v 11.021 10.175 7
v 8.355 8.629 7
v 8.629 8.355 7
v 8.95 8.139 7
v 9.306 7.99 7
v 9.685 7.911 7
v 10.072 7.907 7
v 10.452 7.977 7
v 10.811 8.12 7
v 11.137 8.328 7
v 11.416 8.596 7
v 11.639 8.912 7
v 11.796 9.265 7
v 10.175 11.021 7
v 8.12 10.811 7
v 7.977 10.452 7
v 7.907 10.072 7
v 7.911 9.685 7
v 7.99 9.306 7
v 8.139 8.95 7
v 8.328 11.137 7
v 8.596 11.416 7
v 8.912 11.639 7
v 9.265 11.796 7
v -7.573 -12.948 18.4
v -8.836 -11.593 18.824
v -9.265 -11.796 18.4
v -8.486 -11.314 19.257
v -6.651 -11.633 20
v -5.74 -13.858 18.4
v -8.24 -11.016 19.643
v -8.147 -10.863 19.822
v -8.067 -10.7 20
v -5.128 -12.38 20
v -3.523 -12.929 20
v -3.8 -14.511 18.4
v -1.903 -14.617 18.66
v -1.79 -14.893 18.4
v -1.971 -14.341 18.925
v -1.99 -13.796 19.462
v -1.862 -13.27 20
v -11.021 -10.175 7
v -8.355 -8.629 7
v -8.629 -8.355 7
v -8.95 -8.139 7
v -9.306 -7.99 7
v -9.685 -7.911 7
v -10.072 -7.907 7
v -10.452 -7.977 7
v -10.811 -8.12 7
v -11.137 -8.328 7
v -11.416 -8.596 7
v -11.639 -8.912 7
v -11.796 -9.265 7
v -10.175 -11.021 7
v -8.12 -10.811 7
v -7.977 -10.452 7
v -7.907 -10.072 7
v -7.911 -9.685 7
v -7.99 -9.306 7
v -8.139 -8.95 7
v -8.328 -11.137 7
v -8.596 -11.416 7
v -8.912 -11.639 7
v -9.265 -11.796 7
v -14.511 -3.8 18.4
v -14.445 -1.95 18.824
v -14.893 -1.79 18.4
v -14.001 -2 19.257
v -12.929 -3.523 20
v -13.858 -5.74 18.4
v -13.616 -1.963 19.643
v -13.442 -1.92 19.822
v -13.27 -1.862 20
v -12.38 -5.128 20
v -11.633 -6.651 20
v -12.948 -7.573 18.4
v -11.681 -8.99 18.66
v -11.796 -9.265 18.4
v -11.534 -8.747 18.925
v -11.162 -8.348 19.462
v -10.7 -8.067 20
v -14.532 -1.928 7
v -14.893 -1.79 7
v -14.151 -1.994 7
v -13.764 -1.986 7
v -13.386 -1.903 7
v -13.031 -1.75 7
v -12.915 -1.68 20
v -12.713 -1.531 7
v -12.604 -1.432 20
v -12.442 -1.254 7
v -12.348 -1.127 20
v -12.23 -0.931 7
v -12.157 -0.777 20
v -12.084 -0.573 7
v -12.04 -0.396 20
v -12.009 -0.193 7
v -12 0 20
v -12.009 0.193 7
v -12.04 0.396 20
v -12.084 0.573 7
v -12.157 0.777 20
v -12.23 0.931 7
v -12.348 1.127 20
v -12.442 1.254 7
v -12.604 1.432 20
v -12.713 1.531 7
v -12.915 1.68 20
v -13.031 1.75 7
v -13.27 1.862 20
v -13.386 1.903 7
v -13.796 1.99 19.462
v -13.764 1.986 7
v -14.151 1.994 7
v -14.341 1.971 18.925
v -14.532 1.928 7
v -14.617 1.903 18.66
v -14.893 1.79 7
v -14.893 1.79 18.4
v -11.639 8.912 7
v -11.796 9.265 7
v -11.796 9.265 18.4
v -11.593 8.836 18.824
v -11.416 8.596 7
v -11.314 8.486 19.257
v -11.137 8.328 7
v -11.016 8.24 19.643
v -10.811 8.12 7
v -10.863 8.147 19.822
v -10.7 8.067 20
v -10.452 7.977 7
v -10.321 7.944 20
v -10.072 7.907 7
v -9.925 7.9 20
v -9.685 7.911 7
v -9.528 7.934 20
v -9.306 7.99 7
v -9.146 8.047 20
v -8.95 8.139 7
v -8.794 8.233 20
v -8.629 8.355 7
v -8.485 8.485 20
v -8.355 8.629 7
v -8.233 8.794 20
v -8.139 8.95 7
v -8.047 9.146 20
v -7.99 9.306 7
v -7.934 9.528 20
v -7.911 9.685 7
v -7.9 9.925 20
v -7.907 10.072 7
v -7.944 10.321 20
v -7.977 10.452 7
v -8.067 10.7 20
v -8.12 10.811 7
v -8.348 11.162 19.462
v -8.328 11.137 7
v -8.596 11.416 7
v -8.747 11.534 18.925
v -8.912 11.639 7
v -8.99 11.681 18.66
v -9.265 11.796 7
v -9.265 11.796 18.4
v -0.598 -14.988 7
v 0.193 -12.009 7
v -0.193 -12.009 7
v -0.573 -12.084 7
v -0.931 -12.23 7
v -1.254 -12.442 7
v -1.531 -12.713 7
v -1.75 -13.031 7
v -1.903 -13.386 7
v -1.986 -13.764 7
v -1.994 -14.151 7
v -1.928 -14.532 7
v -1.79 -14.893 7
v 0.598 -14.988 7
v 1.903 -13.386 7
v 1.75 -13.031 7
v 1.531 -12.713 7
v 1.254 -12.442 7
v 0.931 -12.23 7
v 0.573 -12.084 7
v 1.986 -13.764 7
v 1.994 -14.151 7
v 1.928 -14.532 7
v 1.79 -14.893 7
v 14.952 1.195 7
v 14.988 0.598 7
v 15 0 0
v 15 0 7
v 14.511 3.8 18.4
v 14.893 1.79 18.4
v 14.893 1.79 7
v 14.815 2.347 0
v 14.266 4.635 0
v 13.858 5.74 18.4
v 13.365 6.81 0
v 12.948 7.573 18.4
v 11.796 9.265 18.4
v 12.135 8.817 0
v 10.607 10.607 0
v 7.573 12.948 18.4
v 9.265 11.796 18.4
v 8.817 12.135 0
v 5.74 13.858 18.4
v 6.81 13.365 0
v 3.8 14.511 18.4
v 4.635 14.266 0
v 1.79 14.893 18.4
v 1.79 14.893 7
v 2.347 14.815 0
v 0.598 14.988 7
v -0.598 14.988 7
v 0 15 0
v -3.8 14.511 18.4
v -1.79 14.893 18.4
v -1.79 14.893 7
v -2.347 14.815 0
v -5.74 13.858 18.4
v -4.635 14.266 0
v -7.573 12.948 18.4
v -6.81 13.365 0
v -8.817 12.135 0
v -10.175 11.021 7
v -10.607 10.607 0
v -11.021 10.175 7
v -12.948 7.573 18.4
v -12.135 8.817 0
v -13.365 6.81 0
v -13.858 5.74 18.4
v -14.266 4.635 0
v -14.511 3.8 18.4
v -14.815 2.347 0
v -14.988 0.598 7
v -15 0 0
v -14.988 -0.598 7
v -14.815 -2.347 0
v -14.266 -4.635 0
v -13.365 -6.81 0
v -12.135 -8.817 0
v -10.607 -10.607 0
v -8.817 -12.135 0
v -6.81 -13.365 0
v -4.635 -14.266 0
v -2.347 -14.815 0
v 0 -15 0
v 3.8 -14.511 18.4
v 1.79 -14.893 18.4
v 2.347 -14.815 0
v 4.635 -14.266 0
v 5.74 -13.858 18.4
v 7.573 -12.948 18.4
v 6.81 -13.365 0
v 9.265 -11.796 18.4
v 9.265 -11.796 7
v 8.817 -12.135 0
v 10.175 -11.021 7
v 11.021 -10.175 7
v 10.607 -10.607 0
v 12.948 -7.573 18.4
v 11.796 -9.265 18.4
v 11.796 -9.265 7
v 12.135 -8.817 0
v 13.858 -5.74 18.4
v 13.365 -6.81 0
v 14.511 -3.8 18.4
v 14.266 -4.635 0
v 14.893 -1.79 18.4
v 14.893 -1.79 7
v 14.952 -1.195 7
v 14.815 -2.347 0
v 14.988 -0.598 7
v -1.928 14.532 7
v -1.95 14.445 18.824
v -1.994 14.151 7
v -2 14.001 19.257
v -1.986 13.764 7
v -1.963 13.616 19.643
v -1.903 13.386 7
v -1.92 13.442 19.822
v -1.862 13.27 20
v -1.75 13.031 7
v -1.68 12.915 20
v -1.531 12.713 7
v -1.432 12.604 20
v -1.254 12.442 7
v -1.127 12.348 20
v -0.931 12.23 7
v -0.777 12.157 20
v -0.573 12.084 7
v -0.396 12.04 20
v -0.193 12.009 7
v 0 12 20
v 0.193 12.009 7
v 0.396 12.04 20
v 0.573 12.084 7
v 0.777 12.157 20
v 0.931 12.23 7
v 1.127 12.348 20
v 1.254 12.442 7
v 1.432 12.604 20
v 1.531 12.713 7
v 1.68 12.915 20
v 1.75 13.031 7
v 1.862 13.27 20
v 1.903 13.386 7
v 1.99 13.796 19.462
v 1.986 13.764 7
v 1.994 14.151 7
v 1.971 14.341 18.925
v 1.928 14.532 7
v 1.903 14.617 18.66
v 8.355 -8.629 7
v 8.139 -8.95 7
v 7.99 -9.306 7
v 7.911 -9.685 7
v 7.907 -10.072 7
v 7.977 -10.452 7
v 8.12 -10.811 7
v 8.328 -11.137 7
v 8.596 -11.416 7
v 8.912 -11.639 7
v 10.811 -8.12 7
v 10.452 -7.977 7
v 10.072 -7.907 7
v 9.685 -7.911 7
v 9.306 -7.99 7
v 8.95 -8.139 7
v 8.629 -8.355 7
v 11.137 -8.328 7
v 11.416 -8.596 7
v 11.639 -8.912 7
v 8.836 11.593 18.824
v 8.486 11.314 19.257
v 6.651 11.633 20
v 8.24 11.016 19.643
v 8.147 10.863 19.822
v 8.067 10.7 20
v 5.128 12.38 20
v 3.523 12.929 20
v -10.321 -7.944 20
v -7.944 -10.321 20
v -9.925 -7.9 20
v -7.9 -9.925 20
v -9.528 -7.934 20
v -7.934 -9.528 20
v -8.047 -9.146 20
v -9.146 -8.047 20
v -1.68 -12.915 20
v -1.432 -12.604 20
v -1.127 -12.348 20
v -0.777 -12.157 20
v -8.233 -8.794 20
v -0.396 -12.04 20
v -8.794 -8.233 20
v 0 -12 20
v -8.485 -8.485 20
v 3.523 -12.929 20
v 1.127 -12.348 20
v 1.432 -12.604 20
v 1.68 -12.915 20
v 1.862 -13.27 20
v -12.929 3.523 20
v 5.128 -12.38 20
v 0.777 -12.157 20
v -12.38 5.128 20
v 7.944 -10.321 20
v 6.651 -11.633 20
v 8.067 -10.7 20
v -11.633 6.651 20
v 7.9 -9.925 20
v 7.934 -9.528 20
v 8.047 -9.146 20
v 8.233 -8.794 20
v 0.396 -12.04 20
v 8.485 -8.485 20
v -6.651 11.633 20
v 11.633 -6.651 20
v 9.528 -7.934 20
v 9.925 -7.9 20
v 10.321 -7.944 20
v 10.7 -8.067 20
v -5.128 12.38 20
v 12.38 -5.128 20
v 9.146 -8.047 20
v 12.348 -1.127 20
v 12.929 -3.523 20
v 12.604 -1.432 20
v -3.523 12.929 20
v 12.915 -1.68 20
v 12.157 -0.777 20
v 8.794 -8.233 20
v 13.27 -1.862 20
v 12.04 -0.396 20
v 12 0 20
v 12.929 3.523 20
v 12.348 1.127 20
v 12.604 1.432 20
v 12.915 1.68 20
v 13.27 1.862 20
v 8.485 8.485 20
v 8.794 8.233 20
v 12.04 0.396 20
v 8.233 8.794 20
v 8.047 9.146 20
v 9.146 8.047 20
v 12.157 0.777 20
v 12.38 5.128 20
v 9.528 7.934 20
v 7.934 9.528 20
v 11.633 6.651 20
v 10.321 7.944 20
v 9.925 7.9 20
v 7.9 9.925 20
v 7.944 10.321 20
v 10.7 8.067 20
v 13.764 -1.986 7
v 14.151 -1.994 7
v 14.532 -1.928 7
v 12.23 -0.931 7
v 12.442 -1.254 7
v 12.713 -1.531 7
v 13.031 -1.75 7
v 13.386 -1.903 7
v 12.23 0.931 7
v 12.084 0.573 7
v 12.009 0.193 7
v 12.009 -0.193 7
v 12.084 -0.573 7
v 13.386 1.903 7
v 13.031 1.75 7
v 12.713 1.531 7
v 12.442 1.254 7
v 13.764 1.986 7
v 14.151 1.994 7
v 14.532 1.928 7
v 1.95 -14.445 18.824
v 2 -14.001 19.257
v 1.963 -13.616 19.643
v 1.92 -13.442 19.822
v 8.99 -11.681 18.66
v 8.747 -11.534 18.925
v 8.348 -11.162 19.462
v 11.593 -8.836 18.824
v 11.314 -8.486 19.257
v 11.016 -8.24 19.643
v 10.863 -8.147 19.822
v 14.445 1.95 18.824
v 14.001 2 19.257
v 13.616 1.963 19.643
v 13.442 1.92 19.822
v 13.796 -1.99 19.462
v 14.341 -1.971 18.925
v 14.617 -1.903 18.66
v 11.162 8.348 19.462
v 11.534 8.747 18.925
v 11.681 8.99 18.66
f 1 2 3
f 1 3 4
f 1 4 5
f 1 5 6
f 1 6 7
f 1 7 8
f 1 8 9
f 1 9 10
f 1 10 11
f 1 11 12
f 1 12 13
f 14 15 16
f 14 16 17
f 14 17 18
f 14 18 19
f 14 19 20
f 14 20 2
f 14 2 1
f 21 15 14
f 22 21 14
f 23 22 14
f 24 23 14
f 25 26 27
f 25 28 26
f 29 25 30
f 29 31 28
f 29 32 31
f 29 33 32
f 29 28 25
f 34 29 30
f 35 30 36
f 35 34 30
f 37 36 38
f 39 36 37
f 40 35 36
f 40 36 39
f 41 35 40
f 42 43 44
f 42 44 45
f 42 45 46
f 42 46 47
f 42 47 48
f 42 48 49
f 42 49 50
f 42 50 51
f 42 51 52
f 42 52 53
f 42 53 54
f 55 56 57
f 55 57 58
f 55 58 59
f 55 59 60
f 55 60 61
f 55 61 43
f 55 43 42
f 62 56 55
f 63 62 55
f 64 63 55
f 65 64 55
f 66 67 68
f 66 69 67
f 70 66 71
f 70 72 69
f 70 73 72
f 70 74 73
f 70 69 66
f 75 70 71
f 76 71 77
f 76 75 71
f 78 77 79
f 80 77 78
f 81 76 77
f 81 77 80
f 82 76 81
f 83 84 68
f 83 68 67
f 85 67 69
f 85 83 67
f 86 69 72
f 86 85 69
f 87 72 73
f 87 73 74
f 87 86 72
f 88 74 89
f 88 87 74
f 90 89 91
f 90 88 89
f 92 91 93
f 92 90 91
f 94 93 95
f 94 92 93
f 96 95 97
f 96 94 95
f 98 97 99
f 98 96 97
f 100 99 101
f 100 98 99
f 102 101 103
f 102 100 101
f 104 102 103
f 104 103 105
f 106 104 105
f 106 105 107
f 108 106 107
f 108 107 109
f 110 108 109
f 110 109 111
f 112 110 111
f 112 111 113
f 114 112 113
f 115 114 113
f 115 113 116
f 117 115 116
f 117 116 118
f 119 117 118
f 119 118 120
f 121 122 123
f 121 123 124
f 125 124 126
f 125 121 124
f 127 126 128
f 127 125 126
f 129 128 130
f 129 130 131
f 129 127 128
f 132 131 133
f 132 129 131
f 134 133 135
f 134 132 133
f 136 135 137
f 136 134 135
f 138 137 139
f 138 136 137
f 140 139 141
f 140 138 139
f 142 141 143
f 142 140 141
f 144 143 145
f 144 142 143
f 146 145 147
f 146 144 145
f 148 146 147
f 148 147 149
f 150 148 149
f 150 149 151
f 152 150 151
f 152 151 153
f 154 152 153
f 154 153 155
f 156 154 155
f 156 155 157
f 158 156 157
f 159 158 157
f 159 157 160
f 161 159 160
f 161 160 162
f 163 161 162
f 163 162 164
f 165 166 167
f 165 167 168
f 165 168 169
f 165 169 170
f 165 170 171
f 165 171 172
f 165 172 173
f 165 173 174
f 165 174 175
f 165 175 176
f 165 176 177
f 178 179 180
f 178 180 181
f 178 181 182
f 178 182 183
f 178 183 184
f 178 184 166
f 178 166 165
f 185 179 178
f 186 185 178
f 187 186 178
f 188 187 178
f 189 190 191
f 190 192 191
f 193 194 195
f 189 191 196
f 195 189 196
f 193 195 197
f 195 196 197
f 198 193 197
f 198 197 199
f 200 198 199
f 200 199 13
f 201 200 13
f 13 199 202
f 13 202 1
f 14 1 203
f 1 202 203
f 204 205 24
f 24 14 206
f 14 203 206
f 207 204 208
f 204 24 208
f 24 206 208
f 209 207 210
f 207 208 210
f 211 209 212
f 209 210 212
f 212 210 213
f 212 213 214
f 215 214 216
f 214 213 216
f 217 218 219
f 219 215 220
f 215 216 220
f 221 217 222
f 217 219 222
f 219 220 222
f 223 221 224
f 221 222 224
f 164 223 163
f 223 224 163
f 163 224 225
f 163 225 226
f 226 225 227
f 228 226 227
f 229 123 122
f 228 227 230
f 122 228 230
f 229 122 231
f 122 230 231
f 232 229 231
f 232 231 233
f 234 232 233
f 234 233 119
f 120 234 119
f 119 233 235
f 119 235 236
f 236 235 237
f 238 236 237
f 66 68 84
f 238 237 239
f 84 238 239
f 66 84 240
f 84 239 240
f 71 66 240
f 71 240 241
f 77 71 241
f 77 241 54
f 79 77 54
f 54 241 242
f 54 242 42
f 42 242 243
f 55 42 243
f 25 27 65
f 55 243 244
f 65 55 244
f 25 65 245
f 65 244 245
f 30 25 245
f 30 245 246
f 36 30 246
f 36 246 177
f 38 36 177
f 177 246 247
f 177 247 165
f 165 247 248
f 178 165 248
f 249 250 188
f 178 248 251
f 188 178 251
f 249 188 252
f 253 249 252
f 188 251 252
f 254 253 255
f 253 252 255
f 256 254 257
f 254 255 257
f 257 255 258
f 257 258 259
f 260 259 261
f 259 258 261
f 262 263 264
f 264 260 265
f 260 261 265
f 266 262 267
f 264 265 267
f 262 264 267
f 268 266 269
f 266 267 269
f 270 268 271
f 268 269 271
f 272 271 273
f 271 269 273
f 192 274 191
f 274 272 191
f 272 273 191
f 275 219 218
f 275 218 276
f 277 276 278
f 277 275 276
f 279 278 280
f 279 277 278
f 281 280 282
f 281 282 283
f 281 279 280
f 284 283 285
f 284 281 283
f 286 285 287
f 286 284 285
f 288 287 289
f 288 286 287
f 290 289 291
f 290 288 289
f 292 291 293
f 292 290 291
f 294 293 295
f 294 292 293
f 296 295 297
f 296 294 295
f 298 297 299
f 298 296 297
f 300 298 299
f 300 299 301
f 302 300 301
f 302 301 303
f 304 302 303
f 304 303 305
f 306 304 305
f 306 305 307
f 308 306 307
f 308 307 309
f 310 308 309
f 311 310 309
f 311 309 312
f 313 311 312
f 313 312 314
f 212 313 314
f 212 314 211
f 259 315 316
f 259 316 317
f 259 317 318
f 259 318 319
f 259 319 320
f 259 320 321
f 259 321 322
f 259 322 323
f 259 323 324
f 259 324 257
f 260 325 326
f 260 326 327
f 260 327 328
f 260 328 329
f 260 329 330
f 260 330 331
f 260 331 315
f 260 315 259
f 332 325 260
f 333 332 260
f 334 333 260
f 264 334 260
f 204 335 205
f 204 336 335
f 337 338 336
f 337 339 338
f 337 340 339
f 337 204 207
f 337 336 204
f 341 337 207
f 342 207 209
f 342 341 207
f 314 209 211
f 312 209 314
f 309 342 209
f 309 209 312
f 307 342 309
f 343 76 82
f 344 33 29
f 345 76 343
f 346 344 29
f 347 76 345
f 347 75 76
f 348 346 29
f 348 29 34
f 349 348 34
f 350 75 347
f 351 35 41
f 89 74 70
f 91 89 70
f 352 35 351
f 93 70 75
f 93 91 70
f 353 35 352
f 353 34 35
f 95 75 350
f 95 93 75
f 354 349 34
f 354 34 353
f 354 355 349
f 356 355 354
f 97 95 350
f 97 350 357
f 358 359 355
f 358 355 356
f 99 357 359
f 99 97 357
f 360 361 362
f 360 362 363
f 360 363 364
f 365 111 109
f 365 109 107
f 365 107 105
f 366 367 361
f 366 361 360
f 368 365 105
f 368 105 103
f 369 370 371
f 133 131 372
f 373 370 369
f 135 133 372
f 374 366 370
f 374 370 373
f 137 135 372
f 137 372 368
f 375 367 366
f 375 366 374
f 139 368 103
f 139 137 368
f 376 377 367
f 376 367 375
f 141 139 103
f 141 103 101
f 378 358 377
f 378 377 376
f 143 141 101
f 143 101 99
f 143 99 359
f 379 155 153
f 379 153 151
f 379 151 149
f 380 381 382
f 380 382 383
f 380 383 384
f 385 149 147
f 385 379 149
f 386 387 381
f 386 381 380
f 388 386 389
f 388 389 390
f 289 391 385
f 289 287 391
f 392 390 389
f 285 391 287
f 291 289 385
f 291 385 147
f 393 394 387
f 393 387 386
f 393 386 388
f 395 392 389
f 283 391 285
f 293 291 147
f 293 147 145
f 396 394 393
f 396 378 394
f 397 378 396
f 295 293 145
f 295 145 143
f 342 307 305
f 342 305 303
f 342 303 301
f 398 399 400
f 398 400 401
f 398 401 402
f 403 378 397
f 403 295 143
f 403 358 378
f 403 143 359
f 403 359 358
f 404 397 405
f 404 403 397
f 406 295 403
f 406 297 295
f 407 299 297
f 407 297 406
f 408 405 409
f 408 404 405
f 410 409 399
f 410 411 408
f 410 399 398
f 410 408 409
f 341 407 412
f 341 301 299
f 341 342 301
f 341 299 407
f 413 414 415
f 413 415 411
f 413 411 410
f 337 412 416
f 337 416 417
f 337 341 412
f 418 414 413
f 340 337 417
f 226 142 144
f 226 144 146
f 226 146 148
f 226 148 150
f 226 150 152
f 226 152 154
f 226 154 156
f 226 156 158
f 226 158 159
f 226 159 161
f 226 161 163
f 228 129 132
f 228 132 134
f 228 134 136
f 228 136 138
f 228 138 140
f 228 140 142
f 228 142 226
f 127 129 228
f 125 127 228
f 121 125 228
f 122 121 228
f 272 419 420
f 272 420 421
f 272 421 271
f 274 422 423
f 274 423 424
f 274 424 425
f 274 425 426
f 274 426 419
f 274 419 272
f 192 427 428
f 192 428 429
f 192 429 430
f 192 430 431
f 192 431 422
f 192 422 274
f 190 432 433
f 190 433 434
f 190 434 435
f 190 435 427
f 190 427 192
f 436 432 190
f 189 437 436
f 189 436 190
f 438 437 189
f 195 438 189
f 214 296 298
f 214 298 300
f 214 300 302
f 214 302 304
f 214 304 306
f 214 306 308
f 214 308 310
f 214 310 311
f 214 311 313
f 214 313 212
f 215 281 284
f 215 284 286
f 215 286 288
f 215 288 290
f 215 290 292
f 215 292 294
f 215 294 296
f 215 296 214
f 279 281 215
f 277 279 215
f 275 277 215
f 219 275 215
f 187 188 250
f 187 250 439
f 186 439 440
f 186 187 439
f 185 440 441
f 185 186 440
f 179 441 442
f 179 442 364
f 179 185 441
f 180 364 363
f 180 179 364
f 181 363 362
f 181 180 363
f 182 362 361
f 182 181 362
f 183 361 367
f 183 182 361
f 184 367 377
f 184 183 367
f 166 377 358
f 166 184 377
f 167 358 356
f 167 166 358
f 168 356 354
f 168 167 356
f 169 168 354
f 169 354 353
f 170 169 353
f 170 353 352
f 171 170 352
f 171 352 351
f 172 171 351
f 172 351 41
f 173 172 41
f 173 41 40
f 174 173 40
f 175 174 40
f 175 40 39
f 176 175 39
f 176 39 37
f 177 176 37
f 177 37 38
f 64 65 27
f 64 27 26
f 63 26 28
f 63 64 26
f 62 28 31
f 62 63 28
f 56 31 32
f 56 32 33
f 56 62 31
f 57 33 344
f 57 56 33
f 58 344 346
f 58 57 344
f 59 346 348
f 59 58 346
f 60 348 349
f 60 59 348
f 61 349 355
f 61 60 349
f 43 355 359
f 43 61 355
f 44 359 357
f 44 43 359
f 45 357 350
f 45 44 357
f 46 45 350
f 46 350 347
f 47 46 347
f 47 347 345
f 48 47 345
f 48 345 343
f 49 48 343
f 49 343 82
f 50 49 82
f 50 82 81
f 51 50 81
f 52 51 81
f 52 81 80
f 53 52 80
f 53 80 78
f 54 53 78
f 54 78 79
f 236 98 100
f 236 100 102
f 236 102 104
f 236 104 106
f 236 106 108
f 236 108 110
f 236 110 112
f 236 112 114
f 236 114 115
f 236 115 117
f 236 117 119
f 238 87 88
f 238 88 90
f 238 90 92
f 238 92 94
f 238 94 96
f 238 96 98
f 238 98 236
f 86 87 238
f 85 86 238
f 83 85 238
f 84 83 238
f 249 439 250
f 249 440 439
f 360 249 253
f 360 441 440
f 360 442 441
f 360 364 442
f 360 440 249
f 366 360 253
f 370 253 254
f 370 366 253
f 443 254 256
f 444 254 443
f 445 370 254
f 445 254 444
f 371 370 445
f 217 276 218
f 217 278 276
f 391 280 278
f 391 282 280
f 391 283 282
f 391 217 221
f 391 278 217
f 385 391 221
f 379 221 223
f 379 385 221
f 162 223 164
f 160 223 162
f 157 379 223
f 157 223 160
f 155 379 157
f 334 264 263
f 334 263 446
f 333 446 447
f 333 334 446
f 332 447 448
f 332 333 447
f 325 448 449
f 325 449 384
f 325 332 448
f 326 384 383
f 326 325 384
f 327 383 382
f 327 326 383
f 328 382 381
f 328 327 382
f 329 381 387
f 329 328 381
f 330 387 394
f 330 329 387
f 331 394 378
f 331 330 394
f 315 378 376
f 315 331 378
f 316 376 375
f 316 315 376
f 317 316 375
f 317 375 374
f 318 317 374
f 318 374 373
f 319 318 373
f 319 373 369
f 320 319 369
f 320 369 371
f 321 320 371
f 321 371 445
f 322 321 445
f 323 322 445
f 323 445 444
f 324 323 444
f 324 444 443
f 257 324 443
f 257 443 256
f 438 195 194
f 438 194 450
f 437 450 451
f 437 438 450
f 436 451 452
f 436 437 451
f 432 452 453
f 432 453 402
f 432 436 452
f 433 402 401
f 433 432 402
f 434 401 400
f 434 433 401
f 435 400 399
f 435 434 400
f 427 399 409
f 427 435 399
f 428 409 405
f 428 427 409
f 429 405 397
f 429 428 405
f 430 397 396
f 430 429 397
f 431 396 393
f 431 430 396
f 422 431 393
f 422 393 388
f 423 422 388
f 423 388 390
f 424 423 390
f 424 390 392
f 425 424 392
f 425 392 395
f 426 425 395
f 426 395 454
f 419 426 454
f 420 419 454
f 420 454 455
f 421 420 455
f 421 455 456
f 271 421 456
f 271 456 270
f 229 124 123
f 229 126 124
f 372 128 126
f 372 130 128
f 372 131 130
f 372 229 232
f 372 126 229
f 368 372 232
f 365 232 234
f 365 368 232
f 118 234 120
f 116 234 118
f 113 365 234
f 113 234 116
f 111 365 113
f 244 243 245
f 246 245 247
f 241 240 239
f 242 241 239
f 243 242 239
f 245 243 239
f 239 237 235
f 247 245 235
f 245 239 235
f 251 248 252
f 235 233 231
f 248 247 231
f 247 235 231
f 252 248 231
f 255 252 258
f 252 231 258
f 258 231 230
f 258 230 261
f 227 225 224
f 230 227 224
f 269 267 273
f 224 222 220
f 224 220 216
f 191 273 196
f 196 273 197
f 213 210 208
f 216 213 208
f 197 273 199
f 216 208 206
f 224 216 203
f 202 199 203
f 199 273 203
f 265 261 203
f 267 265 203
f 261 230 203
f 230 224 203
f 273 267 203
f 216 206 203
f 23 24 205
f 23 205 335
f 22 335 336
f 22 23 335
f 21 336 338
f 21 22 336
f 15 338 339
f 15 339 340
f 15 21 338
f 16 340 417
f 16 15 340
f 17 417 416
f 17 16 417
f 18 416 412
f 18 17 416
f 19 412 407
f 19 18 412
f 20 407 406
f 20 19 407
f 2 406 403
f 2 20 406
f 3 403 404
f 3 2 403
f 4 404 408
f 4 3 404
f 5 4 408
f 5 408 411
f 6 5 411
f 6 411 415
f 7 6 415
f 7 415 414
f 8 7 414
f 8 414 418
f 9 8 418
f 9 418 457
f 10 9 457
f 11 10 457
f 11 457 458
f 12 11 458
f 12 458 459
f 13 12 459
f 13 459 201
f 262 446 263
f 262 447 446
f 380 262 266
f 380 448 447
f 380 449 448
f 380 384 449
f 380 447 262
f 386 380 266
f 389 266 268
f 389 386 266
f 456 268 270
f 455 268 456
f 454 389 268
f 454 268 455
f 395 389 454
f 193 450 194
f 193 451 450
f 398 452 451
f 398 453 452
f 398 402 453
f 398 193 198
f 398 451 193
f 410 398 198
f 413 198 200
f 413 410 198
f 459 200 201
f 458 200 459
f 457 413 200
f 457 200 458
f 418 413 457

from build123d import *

# Parameters (mm, degrees)
CYLINDER001_R     = 2
CYLINDER001_DEPTH = 30
ARRAY_COUNT       = 8
CYLINDER_R        = 15
CYLINDER_DEPTH    = 20
CHAMFER_SIZE      = 1.6


with BuildPart() as array:
    # Cylinder001 → Cylinder001 (new body)
    with BuildSketch(Plane(origin=(14, 0, 0), x_dir=(1, 0, 0), z_dir=(0, 0, 1))):
        Circle(CYLINDER001_R)
    extrude(amount=CYLINDER001_DEPTH)

    # Array: Array ×8 about axis
    array_axis = Axis((0, 0, 0), (0, 0, 1))


with BuildPart() as array_1:
    add(array.part)
    for i in range(1, ARRAY_COUNT):
        add(array.part.rotate(array_axis, i * 360 / ARRAY_COUNT))


with BuildPart() as array_2:
    # Array placement: moved
    add(array_1.part.moved(Location((0, 0, 7))))


with BuildPart() as cut:
    # Cylinder → Cylinder (new body)
    with BuildSketch(Plane.XY):
        Circle(CYLINDER_R)
    extrude(amount=CYLINDER_DEPTH)

    # Chamfer
    chamfer_edges = [cut.edges().sort_by_distance(p)[0] for p in [
        (-15, 0, 20),
    ]]
    chamfer(chamfer_edges, length=CHAMFER_SIZE)

    # Cut: cut Array
    add(array_2.part, mode=Mode.SUBTRACT)


solid = cut.part
